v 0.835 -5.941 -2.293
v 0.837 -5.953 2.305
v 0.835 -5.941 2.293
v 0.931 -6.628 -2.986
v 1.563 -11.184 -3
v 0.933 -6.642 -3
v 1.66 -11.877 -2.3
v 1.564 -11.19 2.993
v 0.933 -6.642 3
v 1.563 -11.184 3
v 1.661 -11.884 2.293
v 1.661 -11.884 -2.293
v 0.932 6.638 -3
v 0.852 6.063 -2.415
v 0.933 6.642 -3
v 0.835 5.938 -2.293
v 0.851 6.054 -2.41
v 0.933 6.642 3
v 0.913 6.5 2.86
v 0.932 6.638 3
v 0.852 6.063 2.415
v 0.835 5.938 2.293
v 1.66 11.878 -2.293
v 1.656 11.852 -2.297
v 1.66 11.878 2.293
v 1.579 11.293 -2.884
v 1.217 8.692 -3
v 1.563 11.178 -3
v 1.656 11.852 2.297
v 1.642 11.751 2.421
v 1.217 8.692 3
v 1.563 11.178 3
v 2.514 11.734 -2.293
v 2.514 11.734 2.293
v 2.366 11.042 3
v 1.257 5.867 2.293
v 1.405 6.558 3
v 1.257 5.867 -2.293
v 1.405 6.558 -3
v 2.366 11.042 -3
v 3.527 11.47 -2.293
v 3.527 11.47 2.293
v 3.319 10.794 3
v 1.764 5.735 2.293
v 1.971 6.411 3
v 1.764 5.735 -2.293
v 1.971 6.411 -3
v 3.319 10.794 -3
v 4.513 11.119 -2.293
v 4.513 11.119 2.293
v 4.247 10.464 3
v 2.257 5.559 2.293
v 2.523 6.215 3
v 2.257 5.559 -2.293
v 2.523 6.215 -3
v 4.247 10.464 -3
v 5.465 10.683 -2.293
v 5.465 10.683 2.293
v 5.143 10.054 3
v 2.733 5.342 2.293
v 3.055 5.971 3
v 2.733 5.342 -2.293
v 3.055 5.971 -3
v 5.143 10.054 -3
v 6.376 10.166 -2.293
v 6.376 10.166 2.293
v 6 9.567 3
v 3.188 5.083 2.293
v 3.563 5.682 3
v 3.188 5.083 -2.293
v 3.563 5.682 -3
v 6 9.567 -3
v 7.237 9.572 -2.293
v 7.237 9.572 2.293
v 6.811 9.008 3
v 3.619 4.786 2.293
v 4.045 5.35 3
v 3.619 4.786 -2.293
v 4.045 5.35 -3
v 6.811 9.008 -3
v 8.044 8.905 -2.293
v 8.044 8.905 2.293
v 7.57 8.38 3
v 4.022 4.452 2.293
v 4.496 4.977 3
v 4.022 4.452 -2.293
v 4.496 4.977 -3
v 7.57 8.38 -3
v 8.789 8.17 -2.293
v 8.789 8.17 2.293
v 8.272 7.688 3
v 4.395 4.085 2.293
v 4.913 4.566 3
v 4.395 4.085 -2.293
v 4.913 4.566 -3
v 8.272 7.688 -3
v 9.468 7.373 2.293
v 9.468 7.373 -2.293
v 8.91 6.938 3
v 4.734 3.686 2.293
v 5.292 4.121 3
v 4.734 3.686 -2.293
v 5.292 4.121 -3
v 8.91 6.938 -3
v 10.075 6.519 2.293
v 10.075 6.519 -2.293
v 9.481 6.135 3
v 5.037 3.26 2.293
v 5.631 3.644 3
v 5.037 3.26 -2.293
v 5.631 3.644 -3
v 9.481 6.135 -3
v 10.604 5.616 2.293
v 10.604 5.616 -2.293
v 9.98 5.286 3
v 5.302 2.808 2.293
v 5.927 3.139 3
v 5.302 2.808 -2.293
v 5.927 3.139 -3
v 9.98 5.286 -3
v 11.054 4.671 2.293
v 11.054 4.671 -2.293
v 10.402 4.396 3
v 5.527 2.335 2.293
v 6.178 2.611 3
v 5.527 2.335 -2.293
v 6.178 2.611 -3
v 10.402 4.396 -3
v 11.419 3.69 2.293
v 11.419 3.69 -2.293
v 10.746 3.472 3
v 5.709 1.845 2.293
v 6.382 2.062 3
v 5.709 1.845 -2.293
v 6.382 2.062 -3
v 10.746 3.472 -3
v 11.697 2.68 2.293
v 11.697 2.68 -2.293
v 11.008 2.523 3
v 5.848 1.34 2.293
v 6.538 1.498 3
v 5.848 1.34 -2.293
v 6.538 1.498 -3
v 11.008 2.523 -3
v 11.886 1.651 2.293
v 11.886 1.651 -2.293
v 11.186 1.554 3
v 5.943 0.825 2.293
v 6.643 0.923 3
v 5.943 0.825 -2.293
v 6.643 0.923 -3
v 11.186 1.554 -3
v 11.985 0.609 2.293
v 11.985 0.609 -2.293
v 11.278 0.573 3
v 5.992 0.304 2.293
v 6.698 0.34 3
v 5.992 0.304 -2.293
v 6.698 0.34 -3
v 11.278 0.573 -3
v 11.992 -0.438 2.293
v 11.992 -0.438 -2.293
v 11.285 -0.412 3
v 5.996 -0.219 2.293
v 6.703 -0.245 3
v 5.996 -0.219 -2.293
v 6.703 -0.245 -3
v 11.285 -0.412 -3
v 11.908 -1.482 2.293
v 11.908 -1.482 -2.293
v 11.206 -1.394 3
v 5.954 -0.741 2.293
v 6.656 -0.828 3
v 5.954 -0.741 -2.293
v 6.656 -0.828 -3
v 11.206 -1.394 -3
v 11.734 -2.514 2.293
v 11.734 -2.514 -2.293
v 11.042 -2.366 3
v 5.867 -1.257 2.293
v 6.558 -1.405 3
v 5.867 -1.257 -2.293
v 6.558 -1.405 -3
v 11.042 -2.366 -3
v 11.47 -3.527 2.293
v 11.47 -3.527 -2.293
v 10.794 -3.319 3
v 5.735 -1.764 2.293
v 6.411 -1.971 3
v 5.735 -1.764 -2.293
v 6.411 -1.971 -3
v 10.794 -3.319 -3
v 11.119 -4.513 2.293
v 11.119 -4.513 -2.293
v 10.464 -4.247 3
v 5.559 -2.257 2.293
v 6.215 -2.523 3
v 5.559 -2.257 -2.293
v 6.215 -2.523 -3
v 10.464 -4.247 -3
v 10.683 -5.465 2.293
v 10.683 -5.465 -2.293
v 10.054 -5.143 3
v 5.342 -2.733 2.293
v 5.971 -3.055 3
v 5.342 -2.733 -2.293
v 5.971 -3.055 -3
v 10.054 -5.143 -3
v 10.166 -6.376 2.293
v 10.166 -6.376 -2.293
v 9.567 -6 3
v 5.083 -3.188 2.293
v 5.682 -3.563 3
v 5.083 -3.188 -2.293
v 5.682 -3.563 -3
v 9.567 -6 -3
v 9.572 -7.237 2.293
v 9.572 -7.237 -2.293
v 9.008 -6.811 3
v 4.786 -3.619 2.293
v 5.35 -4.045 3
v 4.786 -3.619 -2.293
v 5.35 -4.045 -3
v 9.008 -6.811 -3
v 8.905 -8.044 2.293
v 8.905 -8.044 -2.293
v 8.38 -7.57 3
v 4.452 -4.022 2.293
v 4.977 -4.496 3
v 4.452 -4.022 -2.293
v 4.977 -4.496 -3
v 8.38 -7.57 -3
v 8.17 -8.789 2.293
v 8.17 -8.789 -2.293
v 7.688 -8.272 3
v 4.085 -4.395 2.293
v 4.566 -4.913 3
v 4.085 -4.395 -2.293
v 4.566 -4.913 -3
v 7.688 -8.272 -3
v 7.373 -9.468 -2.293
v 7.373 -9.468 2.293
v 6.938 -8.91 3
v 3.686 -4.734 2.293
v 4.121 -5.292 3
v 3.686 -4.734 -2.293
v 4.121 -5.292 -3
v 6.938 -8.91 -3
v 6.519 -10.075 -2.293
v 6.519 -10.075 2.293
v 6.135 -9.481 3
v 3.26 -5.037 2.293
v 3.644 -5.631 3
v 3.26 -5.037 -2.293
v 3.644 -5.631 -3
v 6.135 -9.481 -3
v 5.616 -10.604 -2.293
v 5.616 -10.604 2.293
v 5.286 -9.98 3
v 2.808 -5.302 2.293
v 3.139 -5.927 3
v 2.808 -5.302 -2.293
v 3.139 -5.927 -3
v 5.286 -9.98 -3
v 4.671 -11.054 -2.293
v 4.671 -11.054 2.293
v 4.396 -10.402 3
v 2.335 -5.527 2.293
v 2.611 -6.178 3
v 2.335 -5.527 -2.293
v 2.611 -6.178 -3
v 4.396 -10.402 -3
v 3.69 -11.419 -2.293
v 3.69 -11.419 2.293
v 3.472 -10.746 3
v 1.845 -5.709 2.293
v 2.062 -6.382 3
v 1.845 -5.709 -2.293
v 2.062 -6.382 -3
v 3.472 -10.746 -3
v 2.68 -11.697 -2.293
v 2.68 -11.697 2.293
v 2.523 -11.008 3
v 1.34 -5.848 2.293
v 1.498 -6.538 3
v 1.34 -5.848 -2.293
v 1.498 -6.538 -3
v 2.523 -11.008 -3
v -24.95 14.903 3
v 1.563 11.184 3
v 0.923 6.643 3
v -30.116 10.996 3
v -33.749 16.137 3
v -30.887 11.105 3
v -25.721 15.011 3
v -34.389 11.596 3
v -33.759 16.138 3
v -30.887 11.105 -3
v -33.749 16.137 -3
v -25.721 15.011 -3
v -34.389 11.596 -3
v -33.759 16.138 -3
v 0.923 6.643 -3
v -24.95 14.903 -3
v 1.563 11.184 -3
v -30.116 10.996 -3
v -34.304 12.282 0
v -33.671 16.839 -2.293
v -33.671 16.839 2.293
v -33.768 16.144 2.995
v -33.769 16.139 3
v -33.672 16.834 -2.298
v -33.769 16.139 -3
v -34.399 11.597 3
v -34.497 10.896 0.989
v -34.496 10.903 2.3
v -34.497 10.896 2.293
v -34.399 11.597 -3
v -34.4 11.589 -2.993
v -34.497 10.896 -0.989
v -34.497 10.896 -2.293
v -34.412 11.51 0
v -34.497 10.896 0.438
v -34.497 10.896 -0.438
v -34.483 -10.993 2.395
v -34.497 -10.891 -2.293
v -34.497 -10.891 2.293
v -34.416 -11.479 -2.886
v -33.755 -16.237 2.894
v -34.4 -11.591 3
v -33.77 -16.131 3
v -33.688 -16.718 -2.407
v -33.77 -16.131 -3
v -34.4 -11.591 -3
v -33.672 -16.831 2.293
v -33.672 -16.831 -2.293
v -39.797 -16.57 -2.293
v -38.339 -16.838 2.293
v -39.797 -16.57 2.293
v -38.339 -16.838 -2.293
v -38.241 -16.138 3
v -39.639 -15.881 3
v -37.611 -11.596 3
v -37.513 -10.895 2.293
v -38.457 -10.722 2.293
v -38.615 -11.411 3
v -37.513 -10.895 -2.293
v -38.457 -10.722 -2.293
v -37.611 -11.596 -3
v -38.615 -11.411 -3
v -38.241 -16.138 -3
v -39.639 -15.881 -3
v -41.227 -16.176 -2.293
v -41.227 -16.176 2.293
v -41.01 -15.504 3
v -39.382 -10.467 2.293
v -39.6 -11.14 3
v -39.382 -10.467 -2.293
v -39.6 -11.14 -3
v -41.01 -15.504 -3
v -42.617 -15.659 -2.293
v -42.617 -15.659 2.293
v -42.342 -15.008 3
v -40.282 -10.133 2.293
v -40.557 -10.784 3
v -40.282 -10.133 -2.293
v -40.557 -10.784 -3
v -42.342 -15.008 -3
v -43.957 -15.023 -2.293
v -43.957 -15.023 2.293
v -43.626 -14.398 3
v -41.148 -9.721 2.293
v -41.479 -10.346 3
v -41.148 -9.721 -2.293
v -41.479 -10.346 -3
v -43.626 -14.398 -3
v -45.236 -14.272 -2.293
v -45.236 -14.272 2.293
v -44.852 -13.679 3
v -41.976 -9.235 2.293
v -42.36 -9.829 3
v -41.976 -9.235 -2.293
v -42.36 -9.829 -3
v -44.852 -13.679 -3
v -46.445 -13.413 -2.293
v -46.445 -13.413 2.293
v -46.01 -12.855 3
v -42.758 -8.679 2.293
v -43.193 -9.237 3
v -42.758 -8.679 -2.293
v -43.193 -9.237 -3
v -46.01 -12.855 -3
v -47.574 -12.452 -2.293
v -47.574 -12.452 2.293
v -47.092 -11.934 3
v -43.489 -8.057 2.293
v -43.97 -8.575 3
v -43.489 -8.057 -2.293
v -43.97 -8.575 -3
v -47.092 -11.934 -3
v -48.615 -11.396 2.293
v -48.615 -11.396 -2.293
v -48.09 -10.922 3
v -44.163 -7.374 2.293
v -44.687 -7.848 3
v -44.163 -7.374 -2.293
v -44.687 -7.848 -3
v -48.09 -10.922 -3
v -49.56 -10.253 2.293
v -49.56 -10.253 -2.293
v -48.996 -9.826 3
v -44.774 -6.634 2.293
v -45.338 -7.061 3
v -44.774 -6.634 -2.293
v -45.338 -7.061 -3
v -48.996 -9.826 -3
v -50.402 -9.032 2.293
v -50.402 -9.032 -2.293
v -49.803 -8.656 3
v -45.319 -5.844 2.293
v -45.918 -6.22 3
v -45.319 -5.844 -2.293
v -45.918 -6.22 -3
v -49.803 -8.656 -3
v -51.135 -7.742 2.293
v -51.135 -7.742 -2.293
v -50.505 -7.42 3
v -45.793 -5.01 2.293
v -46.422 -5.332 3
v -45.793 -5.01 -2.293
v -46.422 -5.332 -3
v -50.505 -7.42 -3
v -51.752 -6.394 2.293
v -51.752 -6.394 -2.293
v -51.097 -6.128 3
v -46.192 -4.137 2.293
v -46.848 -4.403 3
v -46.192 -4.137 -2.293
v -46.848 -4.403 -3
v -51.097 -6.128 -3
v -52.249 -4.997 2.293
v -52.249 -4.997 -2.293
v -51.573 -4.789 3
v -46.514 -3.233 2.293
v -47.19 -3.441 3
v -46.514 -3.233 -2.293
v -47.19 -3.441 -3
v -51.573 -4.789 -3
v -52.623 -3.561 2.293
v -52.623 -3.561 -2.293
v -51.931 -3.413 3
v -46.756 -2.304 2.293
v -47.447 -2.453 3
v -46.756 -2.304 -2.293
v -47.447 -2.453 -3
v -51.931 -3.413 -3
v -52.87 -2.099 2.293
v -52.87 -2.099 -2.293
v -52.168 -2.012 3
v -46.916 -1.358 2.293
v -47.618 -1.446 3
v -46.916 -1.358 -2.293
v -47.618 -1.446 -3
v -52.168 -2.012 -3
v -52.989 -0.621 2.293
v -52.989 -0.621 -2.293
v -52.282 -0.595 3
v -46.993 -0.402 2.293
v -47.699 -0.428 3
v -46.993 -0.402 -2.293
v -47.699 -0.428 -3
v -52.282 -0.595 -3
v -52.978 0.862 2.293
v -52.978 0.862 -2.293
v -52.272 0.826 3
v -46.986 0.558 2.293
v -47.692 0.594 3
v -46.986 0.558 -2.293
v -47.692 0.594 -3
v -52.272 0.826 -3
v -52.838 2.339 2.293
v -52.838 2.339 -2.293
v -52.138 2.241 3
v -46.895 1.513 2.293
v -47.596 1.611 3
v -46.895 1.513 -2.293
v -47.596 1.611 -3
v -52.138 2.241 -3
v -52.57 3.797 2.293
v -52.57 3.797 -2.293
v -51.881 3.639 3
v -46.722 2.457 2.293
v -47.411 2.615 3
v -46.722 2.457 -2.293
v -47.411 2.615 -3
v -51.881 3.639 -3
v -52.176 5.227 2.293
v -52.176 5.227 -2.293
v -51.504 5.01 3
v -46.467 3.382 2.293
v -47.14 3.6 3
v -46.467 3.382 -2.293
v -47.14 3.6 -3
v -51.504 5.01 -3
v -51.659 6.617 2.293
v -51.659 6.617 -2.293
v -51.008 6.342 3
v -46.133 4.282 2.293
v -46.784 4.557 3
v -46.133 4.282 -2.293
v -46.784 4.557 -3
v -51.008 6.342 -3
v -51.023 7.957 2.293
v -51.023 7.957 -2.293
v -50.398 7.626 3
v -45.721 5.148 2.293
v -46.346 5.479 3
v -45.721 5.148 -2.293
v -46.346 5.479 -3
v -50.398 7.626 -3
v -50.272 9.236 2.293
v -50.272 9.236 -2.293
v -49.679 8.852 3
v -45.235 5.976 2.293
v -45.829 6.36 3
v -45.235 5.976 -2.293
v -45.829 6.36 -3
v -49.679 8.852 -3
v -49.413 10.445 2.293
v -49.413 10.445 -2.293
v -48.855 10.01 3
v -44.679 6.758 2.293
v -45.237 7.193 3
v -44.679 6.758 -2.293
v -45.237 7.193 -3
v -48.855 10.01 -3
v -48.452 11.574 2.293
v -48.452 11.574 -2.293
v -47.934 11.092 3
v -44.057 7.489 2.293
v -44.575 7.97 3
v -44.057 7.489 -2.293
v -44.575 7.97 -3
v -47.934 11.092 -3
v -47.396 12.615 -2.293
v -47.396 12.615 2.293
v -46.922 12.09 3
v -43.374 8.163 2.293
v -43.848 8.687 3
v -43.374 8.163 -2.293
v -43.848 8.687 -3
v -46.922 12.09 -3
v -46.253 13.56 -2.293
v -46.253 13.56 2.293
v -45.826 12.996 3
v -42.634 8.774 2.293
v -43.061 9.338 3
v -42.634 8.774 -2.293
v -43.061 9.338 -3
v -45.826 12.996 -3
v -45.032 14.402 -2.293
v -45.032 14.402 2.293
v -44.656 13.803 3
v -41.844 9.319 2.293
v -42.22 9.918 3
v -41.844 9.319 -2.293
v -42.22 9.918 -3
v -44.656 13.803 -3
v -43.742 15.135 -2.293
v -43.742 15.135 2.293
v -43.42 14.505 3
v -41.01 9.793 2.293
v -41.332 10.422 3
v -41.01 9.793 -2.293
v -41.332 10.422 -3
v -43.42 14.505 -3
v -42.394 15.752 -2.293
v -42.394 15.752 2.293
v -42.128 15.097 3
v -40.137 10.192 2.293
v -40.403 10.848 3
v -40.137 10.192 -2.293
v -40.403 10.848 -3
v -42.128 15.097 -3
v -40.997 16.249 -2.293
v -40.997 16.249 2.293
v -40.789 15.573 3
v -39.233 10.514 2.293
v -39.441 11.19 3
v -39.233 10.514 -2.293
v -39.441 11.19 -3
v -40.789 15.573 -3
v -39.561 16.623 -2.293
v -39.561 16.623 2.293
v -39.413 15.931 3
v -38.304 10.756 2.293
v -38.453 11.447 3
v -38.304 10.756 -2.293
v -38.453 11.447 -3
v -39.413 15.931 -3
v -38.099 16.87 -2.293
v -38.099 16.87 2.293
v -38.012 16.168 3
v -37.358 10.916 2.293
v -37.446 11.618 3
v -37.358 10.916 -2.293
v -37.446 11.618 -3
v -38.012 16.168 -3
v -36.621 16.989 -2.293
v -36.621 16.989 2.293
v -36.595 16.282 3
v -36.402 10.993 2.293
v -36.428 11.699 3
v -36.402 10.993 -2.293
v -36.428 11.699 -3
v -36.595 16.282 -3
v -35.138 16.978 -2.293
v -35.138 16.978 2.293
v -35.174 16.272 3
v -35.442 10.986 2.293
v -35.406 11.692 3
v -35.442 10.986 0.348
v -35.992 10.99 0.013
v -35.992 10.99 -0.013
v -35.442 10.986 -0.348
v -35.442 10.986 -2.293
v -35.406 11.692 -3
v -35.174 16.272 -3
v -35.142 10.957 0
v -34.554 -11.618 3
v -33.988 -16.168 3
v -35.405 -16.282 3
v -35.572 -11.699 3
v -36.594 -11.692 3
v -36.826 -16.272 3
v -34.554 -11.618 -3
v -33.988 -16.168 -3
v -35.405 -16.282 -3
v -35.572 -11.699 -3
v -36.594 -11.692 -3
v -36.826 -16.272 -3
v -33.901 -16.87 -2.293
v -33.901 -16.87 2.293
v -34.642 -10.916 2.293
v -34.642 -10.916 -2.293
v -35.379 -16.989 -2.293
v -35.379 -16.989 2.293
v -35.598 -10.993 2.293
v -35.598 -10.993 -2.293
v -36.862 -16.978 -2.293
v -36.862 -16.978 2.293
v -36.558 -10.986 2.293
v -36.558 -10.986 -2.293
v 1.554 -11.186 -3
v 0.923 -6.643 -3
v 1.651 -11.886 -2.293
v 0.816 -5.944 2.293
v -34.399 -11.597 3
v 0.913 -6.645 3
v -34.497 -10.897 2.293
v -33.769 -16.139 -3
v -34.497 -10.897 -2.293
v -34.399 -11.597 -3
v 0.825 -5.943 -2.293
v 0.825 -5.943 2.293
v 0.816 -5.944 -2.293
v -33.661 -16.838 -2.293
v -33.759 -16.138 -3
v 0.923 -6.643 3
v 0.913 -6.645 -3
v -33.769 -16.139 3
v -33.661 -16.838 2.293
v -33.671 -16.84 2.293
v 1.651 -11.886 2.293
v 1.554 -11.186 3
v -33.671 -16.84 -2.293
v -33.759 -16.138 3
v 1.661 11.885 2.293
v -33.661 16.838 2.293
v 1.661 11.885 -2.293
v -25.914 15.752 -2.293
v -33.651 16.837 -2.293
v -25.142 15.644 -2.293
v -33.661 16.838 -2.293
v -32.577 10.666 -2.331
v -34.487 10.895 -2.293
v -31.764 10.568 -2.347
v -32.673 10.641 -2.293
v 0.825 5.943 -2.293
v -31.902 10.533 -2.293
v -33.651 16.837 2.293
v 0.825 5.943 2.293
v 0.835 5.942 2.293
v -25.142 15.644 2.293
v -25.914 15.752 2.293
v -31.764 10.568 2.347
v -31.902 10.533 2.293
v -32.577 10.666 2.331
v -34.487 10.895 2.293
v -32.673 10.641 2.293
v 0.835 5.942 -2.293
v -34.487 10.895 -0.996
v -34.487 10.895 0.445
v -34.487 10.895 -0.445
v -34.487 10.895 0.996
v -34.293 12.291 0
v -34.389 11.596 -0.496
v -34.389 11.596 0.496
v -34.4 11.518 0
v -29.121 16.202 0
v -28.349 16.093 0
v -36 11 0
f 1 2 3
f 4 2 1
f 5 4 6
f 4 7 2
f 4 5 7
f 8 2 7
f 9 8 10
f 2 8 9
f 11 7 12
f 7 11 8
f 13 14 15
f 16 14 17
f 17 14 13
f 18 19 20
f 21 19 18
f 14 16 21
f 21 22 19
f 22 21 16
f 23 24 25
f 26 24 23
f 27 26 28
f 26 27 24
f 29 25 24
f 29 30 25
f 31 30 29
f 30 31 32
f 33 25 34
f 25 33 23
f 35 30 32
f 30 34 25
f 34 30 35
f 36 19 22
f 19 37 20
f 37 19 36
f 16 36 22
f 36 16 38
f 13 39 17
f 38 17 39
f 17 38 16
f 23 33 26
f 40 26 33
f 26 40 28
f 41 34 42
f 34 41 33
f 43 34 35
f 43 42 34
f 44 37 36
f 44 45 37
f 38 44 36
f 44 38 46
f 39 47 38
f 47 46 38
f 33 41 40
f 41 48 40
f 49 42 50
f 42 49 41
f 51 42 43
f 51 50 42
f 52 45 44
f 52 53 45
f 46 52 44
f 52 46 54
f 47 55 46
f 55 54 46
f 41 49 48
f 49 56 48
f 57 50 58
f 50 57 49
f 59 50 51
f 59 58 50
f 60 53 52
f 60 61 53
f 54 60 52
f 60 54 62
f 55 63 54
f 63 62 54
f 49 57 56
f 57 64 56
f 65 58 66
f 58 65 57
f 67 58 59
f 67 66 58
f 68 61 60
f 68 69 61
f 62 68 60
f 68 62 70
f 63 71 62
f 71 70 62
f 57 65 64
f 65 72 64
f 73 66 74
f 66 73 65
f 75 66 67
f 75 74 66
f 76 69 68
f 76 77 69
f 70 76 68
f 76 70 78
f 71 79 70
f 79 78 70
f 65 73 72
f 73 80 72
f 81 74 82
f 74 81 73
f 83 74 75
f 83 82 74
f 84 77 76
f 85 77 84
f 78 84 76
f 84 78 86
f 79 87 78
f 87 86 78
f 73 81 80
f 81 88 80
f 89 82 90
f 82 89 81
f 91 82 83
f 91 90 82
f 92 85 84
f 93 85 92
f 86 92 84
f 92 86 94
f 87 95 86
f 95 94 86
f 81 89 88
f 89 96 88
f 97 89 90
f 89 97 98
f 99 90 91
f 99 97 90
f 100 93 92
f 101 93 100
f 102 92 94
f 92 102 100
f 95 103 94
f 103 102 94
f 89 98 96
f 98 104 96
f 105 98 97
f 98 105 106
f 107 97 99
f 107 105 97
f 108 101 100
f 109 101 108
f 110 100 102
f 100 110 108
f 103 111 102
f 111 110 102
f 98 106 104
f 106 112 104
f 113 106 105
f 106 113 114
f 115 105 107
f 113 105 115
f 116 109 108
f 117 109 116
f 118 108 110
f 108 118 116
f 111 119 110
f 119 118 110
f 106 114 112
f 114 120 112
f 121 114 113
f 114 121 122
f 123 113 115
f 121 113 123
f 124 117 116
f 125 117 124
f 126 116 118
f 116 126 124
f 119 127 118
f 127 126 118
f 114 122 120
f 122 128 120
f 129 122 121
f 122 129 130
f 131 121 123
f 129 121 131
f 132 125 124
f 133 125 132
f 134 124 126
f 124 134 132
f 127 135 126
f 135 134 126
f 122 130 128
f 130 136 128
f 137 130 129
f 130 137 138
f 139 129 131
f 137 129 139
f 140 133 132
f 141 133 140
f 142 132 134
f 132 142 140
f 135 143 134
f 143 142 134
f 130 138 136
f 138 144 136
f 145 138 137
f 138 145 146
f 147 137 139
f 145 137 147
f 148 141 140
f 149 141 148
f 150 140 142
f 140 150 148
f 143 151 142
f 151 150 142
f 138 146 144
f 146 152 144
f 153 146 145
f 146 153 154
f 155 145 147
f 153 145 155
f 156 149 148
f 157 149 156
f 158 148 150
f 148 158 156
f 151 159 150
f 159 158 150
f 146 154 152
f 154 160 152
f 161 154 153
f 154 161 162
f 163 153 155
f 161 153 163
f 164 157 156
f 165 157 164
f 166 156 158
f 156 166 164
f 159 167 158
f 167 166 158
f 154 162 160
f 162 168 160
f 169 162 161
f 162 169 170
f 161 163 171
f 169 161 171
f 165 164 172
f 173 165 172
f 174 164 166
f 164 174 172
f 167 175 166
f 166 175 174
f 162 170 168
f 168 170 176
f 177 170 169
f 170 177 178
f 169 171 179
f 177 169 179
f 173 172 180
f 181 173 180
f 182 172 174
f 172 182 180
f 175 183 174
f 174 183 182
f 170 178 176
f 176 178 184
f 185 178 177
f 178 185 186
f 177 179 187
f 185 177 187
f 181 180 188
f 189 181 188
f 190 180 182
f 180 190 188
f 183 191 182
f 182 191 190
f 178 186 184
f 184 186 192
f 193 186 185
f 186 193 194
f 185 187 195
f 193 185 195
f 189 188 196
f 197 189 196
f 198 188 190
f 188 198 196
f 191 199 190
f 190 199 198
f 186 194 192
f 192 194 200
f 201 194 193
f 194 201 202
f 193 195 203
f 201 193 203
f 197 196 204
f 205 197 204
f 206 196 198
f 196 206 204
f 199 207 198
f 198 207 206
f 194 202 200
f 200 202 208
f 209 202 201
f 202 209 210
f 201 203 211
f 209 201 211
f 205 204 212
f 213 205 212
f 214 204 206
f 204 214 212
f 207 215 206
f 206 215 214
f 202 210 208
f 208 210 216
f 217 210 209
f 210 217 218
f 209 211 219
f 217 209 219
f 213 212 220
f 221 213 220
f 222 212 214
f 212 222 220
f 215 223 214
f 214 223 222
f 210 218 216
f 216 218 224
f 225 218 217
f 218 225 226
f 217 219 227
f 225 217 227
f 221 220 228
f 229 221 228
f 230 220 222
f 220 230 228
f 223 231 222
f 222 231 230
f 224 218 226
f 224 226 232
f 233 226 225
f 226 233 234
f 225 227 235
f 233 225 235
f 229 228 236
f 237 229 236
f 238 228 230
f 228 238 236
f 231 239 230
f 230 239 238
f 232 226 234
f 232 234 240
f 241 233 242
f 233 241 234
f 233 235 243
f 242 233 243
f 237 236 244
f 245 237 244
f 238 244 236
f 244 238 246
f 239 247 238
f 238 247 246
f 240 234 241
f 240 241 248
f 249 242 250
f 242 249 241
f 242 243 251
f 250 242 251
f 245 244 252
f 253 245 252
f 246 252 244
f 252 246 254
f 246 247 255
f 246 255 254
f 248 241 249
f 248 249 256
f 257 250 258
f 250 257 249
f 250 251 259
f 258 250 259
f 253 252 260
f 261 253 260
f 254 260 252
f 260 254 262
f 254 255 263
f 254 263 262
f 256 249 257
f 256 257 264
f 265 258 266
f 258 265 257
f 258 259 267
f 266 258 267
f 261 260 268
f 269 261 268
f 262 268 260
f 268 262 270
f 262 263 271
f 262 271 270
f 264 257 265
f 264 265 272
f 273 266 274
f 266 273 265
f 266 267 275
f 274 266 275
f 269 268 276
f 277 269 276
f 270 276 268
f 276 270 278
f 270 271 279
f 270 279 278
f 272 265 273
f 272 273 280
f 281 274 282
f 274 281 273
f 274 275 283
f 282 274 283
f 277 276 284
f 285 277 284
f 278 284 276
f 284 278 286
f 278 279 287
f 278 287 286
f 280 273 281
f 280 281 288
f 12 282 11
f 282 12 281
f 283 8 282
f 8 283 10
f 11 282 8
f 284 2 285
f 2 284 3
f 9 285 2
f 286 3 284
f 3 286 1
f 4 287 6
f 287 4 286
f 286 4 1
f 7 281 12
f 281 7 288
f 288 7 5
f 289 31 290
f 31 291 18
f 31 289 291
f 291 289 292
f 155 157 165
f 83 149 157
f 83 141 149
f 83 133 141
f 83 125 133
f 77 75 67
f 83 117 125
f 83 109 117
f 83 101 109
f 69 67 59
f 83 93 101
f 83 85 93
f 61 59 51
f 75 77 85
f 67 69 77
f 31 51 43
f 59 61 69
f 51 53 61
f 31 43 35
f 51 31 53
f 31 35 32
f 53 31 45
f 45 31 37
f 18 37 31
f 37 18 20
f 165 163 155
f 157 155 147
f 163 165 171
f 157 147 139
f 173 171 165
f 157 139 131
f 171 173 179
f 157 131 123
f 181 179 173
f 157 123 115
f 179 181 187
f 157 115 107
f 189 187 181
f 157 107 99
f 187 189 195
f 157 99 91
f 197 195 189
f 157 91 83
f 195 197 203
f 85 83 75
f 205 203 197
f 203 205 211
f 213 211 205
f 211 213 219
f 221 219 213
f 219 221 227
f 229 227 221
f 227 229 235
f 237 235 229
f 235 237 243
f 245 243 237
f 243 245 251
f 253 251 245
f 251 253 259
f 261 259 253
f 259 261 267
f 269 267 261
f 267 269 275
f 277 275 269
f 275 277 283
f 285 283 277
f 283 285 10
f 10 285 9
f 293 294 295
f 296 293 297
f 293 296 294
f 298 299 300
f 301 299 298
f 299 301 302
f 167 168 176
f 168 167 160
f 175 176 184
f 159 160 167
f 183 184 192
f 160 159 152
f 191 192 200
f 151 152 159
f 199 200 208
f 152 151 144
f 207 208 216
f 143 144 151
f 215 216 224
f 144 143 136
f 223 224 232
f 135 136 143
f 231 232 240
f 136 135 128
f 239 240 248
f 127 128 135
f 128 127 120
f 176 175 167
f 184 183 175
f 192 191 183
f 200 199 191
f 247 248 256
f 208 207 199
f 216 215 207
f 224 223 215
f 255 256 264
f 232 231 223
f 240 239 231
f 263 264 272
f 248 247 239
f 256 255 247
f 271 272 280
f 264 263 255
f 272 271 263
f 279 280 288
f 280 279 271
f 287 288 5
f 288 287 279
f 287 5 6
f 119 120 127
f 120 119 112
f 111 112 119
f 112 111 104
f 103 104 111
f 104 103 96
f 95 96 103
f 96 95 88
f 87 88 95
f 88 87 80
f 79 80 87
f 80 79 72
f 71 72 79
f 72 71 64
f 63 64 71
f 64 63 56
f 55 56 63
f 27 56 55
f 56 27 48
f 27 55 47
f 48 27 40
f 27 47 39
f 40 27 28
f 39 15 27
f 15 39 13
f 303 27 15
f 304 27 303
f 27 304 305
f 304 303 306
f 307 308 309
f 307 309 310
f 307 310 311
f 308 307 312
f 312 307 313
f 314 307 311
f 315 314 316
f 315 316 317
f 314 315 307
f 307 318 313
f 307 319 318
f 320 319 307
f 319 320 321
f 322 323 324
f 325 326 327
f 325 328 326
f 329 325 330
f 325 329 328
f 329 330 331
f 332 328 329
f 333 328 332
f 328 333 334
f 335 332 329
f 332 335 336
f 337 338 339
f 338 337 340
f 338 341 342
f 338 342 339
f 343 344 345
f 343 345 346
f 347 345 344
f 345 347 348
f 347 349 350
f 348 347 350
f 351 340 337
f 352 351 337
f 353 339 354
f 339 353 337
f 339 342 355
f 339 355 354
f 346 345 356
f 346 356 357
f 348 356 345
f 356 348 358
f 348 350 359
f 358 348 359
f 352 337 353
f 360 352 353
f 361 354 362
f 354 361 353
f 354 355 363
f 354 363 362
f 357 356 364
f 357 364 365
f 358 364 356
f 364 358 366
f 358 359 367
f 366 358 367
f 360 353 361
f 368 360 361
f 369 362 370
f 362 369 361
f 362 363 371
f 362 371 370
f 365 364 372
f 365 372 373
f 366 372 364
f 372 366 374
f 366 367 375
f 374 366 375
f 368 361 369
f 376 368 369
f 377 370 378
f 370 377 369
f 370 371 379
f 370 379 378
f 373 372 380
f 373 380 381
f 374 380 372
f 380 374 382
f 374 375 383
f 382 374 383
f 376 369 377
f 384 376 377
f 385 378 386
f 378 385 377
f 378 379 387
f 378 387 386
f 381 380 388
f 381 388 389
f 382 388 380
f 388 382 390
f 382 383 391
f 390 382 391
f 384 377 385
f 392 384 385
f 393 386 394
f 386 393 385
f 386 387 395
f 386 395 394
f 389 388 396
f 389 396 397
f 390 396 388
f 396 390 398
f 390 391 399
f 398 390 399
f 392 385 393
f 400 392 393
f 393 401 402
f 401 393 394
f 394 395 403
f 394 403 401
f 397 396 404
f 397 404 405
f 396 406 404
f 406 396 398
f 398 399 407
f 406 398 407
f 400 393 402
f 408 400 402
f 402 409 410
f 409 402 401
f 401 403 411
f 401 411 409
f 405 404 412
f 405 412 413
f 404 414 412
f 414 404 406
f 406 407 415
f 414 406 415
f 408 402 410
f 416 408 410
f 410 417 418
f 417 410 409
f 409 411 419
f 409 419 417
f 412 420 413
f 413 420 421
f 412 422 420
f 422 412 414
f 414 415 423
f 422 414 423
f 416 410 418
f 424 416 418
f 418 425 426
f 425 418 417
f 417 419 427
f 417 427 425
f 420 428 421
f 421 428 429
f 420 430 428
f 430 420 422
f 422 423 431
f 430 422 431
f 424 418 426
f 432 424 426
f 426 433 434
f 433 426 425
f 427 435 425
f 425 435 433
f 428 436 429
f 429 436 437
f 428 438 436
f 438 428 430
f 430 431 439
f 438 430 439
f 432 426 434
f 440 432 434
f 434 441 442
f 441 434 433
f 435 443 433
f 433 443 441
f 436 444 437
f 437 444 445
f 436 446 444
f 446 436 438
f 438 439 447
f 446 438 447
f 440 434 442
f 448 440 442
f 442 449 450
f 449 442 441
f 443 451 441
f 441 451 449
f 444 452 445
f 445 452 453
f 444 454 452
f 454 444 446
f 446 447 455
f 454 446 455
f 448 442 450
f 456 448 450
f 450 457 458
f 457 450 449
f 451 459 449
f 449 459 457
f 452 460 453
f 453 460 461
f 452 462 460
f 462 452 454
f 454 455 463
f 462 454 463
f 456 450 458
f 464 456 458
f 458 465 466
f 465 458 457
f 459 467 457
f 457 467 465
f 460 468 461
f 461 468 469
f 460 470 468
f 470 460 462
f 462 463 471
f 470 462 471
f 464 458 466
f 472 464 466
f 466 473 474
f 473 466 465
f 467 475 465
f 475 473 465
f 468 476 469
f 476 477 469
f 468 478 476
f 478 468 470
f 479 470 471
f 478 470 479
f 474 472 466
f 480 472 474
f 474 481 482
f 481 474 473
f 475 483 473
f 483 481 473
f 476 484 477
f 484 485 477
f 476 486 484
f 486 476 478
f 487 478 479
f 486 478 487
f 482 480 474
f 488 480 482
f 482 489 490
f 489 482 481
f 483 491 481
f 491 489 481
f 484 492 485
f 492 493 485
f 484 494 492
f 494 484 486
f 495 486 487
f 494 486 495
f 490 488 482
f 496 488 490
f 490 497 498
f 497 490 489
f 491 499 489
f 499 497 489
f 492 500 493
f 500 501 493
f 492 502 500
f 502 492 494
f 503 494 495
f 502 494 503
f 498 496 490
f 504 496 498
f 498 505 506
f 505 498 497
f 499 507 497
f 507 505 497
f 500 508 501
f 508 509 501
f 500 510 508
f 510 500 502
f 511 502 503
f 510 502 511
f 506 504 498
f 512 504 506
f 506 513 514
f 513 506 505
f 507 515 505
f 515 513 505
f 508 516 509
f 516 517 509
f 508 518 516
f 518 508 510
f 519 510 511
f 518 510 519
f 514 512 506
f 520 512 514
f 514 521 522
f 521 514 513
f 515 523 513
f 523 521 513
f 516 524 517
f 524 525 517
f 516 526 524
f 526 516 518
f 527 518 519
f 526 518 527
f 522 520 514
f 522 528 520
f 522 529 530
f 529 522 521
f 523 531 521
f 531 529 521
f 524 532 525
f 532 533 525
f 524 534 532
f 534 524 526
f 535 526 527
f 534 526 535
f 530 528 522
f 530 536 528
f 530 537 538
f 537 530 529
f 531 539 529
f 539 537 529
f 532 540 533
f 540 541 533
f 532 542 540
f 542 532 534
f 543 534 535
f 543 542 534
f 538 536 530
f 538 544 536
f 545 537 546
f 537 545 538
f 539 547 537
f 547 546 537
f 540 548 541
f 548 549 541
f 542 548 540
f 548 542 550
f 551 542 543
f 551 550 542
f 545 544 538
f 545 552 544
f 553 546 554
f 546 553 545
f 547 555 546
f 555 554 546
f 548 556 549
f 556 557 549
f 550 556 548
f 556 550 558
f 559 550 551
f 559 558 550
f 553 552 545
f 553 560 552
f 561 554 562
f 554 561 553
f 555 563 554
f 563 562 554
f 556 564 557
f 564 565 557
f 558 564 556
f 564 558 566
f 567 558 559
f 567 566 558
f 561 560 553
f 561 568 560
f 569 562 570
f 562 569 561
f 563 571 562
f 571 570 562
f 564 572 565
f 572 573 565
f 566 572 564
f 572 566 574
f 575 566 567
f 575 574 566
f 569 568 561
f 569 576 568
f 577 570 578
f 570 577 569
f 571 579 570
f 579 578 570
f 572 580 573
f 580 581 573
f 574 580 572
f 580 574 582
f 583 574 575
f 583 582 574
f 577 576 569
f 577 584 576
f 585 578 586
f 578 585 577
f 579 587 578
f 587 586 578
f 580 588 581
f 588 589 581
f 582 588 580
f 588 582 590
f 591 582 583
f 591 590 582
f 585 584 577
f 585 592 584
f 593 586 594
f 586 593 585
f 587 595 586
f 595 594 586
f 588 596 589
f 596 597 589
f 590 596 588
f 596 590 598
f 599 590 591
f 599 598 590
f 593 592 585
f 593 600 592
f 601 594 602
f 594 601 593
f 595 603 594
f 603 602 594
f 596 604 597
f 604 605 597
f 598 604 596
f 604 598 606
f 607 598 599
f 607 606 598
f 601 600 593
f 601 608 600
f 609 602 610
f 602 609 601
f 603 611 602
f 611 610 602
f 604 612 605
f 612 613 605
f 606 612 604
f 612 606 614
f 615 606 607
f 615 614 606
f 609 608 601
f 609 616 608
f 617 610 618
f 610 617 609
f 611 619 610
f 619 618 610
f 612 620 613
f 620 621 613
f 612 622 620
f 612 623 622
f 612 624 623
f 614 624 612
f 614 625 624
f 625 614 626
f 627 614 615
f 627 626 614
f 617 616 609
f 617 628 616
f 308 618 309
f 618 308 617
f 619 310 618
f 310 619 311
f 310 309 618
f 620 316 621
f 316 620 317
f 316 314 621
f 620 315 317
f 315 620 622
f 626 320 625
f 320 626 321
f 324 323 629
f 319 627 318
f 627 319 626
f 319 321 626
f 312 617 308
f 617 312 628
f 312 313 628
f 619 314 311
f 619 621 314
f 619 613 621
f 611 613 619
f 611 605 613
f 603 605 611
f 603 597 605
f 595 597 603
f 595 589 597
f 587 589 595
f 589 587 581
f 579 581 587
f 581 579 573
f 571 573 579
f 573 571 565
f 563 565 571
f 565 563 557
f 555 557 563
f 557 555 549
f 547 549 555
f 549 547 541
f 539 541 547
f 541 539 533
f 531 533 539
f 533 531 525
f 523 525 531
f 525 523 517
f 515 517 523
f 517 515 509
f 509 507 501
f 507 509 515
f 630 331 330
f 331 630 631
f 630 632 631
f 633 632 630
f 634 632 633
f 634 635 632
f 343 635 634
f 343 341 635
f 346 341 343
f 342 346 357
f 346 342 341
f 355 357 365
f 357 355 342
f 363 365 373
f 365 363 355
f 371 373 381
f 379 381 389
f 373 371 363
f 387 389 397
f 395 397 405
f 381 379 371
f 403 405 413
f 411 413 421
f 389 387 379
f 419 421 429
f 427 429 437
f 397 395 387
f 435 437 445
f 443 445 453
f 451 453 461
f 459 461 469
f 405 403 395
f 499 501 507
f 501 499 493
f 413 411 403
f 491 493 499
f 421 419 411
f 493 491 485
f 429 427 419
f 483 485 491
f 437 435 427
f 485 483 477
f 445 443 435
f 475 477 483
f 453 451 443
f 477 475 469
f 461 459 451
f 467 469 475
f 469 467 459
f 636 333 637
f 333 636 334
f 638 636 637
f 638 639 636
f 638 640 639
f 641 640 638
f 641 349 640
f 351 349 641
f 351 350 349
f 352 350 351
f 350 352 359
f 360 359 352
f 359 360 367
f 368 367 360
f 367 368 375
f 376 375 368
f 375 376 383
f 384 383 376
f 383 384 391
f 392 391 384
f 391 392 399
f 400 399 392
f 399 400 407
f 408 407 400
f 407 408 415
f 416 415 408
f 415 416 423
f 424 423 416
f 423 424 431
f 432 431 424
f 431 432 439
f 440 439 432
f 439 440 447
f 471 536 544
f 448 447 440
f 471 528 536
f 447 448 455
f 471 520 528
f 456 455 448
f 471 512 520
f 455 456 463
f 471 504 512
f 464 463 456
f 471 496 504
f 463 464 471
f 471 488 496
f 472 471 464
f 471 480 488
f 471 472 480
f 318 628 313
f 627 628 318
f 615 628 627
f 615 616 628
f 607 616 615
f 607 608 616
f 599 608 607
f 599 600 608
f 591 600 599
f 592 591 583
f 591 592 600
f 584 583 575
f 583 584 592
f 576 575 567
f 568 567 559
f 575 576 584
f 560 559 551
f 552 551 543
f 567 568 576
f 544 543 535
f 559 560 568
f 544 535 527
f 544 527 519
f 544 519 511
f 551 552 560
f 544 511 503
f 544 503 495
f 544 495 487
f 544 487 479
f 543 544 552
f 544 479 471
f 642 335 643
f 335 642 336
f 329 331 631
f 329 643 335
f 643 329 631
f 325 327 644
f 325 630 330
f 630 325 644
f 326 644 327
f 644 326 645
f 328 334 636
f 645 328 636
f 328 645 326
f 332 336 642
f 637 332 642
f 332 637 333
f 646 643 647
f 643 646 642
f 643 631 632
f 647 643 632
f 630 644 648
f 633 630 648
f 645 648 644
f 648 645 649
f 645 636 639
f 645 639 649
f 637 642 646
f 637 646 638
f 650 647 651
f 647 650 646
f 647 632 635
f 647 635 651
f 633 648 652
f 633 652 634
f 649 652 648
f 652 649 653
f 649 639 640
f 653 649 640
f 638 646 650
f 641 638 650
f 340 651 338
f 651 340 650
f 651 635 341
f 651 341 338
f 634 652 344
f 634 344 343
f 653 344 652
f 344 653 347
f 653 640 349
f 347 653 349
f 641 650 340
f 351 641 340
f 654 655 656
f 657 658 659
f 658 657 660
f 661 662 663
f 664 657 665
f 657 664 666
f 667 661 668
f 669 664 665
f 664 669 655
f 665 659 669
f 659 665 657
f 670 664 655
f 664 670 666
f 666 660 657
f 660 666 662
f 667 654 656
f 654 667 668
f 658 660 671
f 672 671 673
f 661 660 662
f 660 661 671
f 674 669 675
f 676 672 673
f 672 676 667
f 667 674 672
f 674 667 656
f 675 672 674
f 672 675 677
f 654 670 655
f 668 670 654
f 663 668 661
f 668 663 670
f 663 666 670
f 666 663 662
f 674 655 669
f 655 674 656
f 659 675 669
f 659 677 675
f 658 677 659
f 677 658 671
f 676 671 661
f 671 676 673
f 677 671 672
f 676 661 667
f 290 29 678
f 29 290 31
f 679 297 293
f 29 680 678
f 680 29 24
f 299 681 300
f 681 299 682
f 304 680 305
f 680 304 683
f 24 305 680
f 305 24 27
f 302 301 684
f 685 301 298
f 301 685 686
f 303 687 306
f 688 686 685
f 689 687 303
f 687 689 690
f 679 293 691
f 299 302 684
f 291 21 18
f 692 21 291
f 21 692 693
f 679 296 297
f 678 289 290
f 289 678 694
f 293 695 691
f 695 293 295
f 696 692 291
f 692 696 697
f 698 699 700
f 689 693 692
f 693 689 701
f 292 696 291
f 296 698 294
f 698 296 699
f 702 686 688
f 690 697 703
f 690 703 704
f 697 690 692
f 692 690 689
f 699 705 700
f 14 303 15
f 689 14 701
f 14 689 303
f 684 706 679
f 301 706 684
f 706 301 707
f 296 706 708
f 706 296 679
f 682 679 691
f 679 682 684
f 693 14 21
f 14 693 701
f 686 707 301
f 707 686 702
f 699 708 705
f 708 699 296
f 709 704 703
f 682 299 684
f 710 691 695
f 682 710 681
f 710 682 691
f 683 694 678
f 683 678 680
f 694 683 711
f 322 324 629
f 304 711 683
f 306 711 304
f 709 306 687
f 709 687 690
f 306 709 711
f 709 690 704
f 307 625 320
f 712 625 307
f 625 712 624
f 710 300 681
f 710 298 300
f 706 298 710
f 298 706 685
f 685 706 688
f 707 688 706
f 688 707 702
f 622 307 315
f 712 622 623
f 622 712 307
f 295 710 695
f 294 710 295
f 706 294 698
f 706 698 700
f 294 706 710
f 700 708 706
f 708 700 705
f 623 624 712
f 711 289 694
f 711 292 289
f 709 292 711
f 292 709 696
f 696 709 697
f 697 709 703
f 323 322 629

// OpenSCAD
// Title: Key Carabiner 
// V3: https://www.thingiverse.com/thing:2978765
// Author: https://www.thingiverse.com/Bikecyclist

// V2: https://www.thingiverse.com/thing:57174
// Author: http://www.thingiverse.com/Jinja
// Last Updated Date: 05-12-13

// V1: https://www.thingiverse.com/thing:38291
// Author: http://www.thingiverse.com/Jinja
// Date: 17/12/2012

/////////// START OF PARAMETERS /////////////////

// the first (smaller) radius
radius1 = 6;    

// the second (larger) radius
radius2 = 11;

// the distance between the centers of the radii
length = 36;    

// the thickness of the body
width = 6; 

// the height of the body
height = 6;     

// the width of the gap that cuts the body
gap = 0.39;     

// the mm width of the bevelled edge
rounded = 1;

/////////// END OF PARAMETERS /////////////////

$fs=0.3*1;
$fa=5*1; //smooth
//$fa=20*1; //rough

bevel = rounded / sqrt(2);
// small finite distance, ensures proper meshing - no need to change this
epsilon = 0.01;

difference ()
{
    loop (radius1, radius2, width, height, length);

	translate([-length, radius2, 0])
        rotate([0, 45, - 45 - atan((radius2 - radius1)/length)])
        {
            cube([height*2, length, gap]);
            cube([gap, length, height*2]);
        }
}


module loop (r1, r2, w, h, l)
{
    ring_section (r1, w, h, 180 - 2 * atan((r2 - r1)/l));

    translate ([-l, 0, 0])
        rotate ([0, 0, 180])
            ring_section (r2, w, h, 180 + 2 * atan((r2 - r1)/l));

    for (i = [-1, 1])
        hull ()
        {
            rotate ([0, 0, -i * atan((r2 - r1)/l)])
                translate ([0, i * (r1 + w/2), 0])
                    rotate ([90, 0, 90 + (i - 1) * 90])
                        linear_extrude (epsilon, convexity = 10)
                            xsection (w, h);
                
            translate ([-l, 0, 0])
                rotate ([0, 0, -i * atan((r2 - r1)/l)])
                    translate ([0, i * (r2 + w/2), 0])
                        rotate ([90, 0, 90 + (i - 1) * 90, 0, 90])
                            linear_extrude (epsilon, convexity = 10)
                                xsection (w, h);
        }
}

module ring_section (r, w, h, a)
{
    difference ()
    {
        rotate ([0, 0, -a/2])
            rotate_extrude (angle = 360, convexity = 10)
                translate ([r + w/2, 0])
                    xsection (w, h);
        
        if (a <= 180)
        {
            for (i = [-1, 1])
                rotate ([0, 0, i * (-90 + a/2)])
                    translate ([-r - w, 0, 0])
                        cube ([2 * (r + w + epsilon), 2 * (r + w + 2 * epsilon), 2 * h], center = true);
        }
        else
        {
            for (i = [-1, 1])
                rotate ([0, 0, i * (-90 + a/2)])
                    translate ([-r - w, i * (r + w + 2 * epsilon)/2, 0])
                        cube ([2 * (r + w + epsilon), (r + w + 2 * epsilon), 2 * h], center = true);
        }
    }
}

module xsection (w, h)
{
    polygon ([
        [-w/2 + bevel, -h/2],
        [-w/2, -h/2 + bevel],
        [-w/2, h/2 - bevel],
        [-w/2 + bevel, h/2],
        [w/2 - bevel, h/2],
        [w/2, h/2 - bevel],
        [w/2, -h/2 + bevel],
        [w/2 - bevel, -h/2],
    ]);
}
